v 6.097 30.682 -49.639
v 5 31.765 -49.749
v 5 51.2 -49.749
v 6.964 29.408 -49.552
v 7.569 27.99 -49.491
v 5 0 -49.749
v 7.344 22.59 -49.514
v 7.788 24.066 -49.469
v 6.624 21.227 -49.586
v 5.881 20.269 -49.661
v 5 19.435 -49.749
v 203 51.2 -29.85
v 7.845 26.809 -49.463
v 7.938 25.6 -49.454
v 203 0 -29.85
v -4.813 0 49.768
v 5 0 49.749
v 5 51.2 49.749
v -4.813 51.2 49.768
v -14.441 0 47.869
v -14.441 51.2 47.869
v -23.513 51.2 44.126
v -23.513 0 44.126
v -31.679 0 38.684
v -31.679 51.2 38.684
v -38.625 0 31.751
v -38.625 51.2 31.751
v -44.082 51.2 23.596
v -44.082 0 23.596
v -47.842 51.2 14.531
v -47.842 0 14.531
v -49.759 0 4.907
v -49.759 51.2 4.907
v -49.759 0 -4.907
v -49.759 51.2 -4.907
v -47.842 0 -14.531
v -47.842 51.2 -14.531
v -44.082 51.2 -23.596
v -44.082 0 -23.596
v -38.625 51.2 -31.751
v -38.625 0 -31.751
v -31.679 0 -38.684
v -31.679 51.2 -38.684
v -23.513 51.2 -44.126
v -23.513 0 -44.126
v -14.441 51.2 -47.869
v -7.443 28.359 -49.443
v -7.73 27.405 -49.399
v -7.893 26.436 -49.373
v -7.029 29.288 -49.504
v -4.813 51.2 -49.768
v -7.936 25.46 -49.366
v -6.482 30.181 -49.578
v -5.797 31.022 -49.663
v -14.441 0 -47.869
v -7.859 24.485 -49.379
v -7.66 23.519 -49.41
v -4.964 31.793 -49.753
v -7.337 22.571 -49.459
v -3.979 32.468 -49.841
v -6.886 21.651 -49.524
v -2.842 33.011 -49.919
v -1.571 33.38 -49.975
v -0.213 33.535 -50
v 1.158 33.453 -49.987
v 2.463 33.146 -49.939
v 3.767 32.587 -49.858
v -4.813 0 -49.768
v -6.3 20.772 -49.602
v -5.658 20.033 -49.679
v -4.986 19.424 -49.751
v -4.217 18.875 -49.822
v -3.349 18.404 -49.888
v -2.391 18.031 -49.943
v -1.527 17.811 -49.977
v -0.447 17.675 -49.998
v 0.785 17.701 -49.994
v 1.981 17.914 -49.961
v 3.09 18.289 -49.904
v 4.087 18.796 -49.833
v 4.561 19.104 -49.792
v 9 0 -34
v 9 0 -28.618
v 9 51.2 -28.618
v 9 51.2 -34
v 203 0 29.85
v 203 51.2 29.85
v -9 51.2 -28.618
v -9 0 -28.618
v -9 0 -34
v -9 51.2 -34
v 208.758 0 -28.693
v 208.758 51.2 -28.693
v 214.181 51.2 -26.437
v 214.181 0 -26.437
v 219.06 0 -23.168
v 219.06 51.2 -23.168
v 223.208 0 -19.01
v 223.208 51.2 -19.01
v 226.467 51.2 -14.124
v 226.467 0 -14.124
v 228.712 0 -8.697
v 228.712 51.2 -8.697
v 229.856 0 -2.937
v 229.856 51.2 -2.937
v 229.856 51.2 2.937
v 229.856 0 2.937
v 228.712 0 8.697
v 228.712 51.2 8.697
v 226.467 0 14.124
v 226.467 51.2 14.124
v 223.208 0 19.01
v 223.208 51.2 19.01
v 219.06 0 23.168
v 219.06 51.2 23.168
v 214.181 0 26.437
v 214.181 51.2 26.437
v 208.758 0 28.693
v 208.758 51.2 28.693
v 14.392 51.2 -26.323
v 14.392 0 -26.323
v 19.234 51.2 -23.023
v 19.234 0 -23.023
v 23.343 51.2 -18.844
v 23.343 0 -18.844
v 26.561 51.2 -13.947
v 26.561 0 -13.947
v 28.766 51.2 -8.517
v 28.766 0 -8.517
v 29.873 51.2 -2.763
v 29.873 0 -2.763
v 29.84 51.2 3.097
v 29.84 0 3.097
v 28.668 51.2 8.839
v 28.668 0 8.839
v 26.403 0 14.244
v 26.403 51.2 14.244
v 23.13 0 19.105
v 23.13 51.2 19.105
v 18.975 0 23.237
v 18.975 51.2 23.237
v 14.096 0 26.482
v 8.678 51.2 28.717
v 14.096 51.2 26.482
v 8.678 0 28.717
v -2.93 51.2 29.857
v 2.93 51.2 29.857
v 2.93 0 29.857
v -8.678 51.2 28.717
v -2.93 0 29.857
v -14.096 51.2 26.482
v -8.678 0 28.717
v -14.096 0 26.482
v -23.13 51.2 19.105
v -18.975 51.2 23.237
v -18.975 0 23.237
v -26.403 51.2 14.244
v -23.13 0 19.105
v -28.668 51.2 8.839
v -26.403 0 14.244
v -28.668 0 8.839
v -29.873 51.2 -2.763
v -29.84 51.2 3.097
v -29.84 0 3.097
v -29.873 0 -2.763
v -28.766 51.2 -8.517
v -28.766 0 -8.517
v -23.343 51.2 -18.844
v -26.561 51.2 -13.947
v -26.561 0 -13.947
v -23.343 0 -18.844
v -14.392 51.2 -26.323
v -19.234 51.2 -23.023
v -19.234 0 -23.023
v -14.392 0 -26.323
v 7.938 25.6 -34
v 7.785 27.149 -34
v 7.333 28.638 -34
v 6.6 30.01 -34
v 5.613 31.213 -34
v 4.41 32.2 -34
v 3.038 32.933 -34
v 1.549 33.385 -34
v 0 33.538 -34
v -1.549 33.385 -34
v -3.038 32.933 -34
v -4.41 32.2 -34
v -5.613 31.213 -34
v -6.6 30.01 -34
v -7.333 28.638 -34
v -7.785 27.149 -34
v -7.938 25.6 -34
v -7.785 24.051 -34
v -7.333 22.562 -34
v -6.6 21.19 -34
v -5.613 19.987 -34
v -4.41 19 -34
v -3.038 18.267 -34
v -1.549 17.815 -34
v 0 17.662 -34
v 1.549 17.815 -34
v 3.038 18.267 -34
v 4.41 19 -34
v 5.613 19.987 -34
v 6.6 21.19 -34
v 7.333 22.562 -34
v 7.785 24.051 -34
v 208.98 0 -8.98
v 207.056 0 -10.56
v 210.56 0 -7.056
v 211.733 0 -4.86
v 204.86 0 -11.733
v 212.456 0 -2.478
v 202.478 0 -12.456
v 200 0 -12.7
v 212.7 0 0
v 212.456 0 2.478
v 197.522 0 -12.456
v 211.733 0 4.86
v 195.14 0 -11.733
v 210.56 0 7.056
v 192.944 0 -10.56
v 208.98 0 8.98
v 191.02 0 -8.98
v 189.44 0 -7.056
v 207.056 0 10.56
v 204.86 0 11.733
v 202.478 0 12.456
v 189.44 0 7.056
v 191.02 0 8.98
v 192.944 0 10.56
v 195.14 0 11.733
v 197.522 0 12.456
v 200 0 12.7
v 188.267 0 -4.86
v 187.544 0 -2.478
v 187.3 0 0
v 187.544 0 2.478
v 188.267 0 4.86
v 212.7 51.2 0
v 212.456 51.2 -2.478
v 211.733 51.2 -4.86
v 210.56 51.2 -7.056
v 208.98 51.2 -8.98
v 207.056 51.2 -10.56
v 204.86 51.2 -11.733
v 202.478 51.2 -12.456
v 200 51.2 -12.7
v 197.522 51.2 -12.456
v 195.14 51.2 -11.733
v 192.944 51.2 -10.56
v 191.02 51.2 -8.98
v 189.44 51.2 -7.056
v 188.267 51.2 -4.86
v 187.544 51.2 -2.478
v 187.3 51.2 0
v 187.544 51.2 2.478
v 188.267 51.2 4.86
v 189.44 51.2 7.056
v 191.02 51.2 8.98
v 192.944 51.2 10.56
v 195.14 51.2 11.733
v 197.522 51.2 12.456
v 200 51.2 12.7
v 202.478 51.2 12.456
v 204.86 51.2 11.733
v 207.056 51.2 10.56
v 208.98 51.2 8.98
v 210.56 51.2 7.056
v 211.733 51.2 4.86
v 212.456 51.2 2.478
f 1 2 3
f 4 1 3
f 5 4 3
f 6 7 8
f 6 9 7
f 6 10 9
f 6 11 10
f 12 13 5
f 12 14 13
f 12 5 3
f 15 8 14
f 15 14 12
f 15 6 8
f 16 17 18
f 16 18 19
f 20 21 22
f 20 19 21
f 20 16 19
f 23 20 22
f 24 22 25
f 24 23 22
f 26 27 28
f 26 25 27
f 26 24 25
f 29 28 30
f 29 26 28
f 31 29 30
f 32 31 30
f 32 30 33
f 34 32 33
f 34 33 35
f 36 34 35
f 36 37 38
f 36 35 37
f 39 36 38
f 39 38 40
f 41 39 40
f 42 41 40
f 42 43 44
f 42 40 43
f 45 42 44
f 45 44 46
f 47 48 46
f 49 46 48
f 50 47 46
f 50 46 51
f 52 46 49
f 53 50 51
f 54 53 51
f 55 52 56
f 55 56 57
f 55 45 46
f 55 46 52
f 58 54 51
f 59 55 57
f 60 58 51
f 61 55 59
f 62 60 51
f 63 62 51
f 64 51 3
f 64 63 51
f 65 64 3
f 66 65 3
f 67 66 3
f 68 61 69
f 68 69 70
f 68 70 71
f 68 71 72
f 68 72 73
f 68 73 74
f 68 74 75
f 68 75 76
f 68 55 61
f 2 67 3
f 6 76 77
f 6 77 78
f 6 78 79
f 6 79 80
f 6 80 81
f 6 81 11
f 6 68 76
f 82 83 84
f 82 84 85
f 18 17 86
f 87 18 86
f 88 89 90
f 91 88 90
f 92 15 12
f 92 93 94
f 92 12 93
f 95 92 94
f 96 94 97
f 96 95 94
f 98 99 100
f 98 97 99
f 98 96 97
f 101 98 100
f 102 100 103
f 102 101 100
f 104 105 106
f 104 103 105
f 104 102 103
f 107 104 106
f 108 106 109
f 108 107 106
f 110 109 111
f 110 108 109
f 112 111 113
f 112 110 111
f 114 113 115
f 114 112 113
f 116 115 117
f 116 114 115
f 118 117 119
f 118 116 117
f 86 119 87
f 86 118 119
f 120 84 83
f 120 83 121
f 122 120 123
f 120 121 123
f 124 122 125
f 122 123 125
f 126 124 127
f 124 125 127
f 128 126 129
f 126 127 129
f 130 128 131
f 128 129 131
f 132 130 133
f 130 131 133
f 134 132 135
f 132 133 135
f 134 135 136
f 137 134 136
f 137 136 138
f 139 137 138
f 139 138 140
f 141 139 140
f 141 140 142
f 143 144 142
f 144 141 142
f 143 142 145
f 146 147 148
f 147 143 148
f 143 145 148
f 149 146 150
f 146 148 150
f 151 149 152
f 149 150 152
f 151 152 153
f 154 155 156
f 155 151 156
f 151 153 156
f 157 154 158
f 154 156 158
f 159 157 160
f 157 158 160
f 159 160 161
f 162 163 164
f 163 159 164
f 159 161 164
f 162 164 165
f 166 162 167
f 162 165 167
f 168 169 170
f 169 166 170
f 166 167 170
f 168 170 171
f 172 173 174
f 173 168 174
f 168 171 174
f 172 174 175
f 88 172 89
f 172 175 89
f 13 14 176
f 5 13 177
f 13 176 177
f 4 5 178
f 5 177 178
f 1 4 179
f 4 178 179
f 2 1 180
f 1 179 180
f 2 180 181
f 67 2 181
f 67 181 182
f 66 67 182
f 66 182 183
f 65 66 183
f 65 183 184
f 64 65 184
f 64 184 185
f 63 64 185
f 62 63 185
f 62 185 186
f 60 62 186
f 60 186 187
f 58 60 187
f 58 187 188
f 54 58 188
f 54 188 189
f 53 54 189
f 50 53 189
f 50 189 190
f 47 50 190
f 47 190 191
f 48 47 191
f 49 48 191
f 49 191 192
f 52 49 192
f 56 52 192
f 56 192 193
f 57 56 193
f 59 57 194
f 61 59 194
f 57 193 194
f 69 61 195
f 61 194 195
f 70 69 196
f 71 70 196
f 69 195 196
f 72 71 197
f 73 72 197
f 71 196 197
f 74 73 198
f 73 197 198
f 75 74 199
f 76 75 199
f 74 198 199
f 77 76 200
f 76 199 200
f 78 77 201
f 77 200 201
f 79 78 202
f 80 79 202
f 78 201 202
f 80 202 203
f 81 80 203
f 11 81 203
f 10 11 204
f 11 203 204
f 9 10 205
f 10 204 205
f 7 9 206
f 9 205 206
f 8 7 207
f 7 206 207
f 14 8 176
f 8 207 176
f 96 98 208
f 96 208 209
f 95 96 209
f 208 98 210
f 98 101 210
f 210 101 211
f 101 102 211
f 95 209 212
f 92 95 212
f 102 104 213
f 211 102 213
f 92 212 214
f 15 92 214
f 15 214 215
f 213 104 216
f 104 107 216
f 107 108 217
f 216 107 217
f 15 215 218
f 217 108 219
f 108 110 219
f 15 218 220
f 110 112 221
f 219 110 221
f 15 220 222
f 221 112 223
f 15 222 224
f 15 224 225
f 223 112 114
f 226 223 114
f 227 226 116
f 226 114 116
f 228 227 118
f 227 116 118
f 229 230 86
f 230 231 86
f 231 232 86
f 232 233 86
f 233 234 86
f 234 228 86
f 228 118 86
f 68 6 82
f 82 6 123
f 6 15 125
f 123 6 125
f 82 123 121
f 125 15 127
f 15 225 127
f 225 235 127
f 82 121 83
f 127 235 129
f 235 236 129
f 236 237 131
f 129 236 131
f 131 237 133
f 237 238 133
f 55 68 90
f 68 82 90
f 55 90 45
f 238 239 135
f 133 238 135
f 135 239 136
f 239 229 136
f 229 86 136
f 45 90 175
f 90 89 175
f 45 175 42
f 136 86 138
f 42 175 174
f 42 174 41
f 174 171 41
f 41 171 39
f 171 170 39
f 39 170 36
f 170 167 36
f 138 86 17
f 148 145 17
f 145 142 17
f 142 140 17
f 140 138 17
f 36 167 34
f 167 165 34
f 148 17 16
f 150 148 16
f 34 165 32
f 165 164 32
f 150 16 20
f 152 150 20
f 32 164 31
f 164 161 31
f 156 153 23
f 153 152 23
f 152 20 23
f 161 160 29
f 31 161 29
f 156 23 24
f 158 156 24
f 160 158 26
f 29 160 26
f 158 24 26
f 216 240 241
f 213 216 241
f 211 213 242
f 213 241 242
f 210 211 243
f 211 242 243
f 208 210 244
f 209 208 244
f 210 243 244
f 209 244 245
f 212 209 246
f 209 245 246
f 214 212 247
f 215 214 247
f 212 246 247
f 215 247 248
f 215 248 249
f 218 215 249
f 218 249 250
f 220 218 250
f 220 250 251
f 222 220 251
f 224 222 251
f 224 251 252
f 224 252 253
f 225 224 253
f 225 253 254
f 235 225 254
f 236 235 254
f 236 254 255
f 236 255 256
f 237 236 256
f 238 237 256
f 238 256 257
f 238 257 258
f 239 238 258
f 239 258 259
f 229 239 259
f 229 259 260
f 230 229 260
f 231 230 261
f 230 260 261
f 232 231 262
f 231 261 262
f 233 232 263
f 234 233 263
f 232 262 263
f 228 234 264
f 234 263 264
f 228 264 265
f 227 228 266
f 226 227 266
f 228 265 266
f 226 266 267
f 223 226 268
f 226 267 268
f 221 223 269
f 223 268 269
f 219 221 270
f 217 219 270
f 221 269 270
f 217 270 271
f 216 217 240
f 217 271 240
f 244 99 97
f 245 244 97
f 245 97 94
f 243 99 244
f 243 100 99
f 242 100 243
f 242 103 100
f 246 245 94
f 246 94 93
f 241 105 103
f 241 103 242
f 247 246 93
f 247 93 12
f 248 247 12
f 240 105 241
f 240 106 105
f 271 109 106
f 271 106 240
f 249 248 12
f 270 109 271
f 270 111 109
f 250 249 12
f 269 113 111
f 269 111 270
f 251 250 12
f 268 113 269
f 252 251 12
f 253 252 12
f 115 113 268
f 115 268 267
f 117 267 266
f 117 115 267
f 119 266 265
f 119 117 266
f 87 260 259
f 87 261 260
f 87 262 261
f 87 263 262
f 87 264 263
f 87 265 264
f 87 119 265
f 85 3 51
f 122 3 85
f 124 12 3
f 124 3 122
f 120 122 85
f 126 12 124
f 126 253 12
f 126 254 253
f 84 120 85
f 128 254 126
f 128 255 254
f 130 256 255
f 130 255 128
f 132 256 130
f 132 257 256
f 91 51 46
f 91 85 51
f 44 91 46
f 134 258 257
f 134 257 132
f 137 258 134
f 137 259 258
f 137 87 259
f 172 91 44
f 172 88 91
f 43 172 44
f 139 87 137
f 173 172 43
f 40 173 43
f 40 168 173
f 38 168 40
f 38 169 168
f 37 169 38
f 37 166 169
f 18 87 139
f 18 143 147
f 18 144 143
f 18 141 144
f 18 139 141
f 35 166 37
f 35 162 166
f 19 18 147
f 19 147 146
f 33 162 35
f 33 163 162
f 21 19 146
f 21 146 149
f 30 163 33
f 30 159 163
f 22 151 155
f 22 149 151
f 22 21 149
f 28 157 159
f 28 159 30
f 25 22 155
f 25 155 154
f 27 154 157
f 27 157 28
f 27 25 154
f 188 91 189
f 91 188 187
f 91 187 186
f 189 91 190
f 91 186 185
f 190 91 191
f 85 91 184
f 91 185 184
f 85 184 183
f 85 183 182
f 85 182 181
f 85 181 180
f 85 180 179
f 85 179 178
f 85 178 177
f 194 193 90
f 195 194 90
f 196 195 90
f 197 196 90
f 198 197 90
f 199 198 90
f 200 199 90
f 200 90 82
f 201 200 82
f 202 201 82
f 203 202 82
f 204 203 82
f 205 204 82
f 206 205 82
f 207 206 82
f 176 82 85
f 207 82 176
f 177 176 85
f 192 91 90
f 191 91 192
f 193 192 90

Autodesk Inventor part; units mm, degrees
ref_plane "YZ Plane" through (0, 0, 0) normal (1, 0, 0) x (0, 1, 0)
ref_plane "XZ Plane" through (0, 0, 0) normal (0, 1, 0) x (-1, 0, 0)
ref_plane "XY Plane" through (0, 0, 0) normal (0, 0, 1) x (1, 0, 0)
sketch "Sketch1" plane through (0, 0, 0) normal (0, 1, 0) x (-1, 0, 0)
  arc A0 (9, -28.6182) -> (-9, -28.6182) centre (0, 0) ccw
  arc A1 (-5, 49.7494) -> (-5, -49.7494) centre (0, 0) ccw construction
  line L0 (0, 0) -> (-200, 0) construction
  arc A2 (-170, 0) -> (-200, 30) centre (-200, 0) ccw construction
  line L1 (-200, 30) -> (-200, -30) construction
  line L2 (-5, -49.7494) -> (-203, -29.8496)
  line L3 (-5, 49.7494) -> (-203, 29.8496)
  arc A3 (-5, -49.7494) -> (-5, 49.7494) centre (0, 0) ccw
  arc A4 (-200, -30) -> (-170, 0) centre (-200, 0) ccw construction
  arc A5 (-200, 30) -> (-200, -30) centre (-200, 0) ccw
  line L4 (0, 0) -> (0, -30) construction
  line L5 (9, -23) -> (-9, -23) construction
  line L6 (9, -23) -> (9, -28.6182) construction
  line L7 (-9, -23) -> (-9, -28.6182) construction
  line L8 (9, -28.6182) -> (9, -34)
  line L9 (-9, -28.6182) -> (-9, -34)
  line L10 (9, -34) -> (-9, -34)
  arc A6 (0, -30) -> (9, -28.6182) centre (0, 0) ccw construction
  arc A7 (-9, -28.6182) -> (0, -30) centre (0, 0) ccw construction
  dimension "d0" = 60
  dimension "d1" = 100
  dimension "d2" = 200
  dimension "d3" = 60
  dimension "d5" = 18
  dimension "d6" = 7
  dimension "d7" = 4
extrude "Extrusion1" add sketch "Sketch1" along normal blind 51.2
sketch "Sketch2" plane through (0, 51.2, 0) normal (0, 1, 0) x (1, 0, 0)
  arc A0 (203, -29.8496) -> (203, 29.8496) centre (200, 0) ccw projected
  circle A1 centre (200, 0) radius 12.7
  point P0 (0, 0)
  dimension "d10" = 25.4
extrude "Extrusion4" cut sketch "Sketch2" against normal through all
sketch "Sketch4" plane through (-9, 0, -34) normal (0, 0, 1) x (1, 0, 0)
  line L0 (0, 0) -> (18, 0) projected
  line L1 (18, 0) -> (18, 51.2) projected
  line L2 (0, 51.2) -> (18, 51.2) projected
  line L3 (0, 0) -> (0, 51.2) projected
  line L4 (9, 51.2) -> (9, 0) construction
  line L5 (0, 0) -> (0, 51.2) construction
  line L6 (0, 25.6) -> (18, 25.6) construction
  circle A0 centre (9, 25.6) radius 7.9375
  dimension "d24" = 15.875
extrude "Extrusion5" cut sketch "Sketch4" against normal through all contours A0
thread "Thread3" size "M16x2" class "6H" standard "ANSI Metric M Profile" length 44.7802
properties part number "placa manivela" material "Steel, Carbon"
